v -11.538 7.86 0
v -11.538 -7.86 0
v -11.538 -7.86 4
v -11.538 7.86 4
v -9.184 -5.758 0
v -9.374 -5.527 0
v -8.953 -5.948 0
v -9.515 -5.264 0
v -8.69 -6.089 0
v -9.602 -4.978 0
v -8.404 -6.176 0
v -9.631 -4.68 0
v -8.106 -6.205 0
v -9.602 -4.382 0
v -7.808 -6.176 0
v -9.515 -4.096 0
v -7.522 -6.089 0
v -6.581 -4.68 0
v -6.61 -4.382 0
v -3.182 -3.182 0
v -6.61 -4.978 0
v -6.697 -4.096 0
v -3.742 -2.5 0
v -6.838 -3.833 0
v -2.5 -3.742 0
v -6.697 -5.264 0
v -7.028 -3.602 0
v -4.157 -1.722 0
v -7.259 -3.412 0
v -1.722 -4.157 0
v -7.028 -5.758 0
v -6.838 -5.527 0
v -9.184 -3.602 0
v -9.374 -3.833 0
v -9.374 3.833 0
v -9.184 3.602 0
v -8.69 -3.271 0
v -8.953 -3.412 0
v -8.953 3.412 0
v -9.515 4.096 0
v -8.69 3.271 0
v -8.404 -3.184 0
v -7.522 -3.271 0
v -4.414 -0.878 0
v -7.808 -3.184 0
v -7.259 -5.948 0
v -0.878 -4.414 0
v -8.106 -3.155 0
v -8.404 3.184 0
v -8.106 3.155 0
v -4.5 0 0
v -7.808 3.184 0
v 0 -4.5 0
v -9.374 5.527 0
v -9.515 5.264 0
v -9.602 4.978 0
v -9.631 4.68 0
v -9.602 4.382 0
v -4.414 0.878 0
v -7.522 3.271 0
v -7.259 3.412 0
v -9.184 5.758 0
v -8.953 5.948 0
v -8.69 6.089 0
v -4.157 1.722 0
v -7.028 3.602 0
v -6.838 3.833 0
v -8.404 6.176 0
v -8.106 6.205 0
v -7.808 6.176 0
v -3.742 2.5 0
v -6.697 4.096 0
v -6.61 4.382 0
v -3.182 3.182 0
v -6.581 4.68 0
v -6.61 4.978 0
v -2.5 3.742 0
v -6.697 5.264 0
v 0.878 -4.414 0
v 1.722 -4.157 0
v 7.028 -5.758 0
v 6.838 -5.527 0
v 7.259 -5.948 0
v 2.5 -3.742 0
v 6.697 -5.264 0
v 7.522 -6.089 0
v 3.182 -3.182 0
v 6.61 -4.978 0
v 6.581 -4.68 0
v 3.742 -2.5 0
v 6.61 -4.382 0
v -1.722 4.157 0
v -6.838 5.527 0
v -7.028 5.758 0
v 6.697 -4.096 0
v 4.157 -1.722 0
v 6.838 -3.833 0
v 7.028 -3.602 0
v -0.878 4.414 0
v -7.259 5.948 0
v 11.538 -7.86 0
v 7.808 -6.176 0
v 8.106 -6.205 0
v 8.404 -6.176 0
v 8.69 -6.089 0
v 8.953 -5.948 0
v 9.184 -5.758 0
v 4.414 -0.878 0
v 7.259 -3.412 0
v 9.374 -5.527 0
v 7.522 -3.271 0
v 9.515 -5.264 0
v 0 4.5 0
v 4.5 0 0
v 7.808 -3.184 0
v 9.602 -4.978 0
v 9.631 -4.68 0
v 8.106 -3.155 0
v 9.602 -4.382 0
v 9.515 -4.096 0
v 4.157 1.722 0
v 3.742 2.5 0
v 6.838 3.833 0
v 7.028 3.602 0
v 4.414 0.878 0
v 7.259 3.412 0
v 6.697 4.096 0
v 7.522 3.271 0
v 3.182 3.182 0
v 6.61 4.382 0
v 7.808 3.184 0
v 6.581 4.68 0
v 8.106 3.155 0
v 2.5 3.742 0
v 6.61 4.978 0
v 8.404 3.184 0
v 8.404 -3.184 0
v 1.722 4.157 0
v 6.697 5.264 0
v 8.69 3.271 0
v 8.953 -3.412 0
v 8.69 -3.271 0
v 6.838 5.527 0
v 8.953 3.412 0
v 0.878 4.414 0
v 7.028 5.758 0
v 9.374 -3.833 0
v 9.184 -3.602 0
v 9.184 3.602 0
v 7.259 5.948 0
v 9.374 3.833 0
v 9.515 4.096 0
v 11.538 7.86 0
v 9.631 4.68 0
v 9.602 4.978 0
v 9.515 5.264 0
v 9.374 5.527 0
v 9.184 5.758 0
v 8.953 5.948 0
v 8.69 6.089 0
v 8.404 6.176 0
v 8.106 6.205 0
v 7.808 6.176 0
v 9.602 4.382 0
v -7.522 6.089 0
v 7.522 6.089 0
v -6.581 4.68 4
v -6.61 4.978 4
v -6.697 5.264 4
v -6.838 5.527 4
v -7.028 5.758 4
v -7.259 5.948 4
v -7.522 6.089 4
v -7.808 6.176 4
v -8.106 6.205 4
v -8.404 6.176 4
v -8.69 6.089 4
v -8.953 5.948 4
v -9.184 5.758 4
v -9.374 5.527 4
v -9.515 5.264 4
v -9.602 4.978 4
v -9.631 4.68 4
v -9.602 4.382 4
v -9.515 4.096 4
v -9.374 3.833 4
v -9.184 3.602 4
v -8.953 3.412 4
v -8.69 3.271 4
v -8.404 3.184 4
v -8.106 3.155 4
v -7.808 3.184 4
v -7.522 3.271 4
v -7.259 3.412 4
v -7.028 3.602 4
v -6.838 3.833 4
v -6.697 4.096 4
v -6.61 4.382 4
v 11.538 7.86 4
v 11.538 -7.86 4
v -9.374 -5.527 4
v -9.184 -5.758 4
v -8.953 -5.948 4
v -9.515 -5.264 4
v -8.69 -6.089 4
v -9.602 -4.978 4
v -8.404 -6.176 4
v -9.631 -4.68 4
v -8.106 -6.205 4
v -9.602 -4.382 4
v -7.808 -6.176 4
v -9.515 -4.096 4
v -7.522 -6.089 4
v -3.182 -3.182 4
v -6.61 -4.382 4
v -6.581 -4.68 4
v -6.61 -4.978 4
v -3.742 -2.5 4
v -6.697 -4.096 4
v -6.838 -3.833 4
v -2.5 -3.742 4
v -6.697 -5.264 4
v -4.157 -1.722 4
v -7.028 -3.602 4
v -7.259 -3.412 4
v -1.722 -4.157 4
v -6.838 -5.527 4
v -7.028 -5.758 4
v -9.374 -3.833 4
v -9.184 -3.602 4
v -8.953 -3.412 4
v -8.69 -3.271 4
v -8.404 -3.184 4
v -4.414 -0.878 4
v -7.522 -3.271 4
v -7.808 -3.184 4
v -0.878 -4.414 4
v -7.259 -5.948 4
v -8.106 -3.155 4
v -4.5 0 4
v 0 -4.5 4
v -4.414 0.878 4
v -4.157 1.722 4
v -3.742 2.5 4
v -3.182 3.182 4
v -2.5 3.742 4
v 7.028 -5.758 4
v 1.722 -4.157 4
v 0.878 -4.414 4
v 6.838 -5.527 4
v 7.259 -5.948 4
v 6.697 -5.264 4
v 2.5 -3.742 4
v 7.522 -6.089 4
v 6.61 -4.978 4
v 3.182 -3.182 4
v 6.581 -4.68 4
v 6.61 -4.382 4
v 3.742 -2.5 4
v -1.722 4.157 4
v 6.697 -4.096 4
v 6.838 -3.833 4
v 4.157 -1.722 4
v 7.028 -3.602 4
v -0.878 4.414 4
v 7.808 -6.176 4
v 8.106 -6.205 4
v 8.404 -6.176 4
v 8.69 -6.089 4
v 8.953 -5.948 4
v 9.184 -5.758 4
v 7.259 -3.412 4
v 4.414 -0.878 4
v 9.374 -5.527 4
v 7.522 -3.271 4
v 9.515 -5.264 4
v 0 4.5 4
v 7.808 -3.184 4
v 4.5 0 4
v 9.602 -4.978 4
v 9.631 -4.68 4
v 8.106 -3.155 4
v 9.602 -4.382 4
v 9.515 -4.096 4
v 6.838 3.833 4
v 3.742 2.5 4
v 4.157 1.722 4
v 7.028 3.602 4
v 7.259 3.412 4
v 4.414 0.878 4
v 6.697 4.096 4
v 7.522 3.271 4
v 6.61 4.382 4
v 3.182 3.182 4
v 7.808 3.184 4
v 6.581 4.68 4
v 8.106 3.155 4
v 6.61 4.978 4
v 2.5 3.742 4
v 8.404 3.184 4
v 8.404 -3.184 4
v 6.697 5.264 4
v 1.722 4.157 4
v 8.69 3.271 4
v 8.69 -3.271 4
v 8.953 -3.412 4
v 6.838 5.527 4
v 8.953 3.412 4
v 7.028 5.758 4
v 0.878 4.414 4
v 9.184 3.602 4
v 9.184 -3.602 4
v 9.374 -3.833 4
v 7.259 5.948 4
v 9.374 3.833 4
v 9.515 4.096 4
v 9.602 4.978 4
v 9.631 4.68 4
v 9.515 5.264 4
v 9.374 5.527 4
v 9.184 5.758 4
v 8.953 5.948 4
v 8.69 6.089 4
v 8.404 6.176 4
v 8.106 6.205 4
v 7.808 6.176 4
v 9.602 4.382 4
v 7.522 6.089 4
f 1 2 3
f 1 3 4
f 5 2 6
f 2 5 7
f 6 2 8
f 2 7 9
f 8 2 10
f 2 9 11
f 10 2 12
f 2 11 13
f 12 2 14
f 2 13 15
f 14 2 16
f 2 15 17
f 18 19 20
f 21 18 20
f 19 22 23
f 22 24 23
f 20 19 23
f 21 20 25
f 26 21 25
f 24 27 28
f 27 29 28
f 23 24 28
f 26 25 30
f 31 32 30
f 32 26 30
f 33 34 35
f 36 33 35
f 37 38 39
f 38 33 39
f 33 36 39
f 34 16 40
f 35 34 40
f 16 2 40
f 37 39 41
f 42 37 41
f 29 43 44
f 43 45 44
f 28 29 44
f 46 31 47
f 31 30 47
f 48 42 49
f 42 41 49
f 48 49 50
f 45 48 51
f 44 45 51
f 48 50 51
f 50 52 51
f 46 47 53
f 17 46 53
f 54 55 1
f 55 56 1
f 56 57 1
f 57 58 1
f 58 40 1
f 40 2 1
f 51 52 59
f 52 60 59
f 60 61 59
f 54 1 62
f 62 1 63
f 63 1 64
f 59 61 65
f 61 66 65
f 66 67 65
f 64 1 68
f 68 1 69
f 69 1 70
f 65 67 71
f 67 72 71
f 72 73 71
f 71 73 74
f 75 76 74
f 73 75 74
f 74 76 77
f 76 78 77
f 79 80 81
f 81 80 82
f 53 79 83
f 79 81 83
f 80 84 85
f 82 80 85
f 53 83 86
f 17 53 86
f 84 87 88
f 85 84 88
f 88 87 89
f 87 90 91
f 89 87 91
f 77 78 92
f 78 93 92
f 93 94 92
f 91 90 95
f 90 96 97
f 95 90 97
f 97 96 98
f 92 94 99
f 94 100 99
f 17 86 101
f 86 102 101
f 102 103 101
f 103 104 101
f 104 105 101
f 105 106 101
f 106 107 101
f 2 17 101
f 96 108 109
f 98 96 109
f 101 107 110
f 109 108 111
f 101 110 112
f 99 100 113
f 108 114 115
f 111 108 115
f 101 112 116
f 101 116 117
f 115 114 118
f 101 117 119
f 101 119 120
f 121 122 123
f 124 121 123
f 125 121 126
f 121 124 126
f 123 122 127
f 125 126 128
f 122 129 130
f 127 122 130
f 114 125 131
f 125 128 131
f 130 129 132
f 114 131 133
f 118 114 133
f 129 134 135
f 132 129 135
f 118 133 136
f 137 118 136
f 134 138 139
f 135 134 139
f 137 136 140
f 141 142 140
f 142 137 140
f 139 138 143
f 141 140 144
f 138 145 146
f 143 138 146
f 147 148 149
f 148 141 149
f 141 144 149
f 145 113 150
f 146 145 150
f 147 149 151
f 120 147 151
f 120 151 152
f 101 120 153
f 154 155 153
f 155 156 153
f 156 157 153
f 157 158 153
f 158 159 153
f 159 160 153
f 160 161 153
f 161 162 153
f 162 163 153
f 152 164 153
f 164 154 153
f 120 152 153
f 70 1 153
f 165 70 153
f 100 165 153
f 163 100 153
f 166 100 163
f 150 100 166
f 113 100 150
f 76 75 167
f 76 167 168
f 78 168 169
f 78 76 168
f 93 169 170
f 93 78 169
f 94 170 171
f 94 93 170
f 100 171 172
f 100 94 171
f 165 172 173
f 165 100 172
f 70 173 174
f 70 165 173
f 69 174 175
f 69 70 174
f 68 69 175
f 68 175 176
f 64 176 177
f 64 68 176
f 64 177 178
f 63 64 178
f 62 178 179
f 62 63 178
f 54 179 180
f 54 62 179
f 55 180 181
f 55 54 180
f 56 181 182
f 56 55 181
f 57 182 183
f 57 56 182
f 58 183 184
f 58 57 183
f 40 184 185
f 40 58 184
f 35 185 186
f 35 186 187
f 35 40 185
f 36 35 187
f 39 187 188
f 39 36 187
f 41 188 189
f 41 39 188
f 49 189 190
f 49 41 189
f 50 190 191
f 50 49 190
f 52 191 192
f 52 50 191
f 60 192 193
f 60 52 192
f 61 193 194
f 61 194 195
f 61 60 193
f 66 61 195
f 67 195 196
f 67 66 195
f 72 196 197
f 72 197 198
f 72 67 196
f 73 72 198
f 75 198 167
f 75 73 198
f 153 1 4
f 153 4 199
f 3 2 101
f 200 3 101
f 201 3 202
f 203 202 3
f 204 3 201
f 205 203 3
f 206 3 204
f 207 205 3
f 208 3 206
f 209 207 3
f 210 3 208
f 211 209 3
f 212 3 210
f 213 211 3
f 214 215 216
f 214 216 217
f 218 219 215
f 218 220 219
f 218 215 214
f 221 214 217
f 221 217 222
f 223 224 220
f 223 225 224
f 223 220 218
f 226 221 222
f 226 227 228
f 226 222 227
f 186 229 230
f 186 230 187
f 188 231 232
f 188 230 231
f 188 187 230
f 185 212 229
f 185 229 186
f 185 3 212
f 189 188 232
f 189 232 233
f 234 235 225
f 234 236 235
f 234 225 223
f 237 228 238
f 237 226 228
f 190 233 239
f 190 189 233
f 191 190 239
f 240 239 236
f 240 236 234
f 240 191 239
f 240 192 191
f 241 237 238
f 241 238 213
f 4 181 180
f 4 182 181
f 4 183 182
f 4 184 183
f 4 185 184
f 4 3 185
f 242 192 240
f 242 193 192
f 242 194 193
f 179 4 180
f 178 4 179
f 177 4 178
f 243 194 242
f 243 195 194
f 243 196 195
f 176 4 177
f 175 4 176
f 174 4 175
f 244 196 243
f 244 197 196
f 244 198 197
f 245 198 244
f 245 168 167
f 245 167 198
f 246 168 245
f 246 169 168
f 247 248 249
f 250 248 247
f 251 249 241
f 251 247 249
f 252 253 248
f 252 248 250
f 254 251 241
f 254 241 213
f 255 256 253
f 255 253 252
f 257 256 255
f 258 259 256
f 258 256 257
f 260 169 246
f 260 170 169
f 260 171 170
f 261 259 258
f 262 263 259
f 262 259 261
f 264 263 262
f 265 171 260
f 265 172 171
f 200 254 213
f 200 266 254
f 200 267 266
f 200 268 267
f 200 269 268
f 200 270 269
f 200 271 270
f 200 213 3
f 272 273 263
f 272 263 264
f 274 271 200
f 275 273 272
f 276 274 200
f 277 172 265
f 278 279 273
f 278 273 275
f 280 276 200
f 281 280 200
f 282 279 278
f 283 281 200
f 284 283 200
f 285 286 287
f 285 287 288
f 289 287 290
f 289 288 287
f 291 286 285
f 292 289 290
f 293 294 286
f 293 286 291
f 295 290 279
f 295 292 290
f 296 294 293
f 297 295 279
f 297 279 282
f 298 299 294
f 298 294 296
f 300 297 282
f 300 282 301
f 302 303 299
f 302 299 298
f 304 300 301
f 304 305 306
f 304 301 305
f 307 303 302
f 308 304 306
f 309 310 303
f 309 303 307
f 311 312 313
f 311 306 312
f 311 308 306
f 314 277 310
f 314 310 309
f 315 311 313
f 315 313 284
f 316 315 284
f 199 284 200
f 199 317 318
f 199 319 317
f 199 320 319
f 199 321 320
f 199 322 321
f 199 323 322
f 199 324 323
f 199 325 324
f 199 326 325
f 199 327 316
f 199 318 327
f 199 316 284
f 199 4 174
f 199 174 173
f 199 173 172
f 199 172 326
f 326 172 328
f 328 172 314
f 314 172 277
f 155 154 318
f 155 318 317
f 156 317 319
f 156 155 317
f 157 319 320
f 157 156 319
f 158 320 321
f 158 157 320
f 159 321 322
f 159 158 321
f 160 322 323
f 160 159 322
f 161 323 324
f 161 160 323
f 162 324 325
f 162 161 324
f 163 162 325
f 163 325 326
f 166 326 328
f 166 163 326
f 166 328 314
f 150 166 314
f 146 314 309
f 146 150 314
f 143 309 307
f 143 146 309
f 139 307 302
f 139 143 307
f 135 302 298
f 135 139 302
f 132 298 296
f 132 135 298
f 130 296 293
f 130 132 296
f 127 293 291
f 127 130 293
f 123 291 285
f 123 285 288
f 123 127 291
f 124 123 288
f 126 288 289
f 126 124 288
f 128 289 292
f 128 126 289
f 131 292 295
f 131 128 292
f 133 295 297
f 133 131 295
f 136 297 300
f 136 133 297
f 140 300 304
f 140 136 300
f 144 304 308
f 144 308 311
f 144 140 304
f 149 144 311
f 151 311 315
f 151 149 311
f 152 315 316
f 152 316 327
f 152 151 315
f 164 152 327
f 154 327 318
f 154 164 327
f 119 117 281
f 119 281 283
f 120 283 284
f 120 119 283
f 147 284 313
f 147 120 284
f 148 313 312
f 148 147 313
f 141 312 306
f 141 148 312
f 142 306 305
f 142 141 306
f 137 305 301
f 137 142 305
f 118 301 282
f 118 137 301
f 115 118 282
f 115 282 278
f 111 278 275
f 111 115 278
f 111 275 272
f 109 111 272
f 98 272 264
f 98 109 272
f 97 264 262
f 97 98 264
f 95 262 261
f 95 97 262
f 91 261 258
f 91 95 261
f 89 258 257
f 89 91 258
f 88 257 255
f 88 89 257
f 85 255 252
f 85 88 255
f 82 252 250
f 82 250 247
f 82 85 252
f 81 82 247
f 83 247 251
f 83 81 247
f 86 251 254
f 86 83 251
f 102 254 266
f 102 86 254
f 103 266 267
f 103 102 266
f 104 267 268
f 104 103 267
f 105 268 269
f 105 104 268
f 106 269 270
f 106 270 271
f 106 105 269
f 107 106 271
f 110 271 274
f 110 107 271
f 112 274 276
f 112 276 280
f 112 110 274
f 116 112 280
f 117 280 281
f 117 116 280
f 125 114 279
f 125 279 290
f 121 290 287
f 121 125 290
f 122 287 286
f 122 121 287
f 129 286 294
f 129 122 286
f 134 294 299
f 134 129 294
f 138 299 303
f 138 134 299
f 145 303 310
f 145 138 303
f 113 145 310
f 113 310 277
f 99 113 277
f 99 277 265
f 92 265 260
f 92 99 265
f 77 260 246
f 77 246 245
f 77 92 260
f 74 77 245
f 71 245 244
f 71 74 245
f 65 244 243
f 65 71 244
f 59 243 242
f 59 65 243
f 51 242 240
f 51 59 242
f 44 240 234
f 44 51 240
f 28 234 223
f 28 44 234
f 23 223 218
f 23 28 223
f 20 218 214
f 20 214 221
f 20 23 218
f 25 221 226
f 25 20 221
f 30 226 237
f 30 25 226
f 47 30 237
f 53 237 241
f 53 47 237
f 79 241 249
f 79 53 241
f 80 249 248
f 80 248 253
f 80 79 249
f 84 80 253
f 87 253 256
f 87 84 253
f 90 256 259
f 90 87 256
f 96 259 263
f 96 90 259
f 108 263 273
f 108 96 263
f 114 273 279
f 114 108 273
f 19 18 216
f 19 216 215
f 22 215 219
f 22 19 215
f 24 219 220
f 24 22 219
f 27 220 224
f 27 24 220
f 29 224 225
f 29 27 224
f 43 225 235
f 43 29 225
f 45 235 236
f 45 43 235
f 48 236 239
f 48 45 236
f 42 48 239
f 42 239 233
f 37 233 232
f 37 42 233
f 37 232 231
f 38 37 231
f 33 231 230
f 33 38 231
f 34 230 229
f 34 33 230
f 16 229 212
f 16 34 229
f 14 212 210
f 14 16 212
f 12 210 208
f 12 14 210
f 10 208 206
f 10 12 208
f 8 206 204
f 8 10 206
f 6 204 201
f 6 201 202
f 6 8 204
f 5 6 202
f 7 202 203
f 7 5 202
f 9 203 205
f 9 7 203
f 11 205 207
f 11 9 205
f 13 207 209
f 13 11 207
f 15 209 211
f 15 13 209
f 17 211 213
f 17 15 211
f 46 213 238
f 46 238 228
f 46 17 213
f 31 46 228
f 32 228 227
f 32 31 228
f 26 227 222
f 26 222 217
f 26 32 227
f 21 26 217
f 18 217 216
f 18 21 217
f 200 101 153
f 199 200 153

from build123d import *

# Parameters (mm, degrees)
SKETCH1_W           = 23.075946232
SKETCH1_H           = 15.72
SKETCH1_R           = 1.525
SKETCH1_R_2         = 4.5
BOSS_EXTRUDE2_DEPTH = 4


with BuildPart() as part:
    # Sketch1 → Boss-Extrude2 (new body)
    with BuildSketch(Plane.XY):
        Rectangle(SKETCH1_W, SKETCH1_H)
        with Locations((-8.105997779, -4.68)):
            Circle(SKETCH1_R, mode=Mode.SUBTRACT)
        with Locations((8.105997779, -4.68)):
            Circle(SKETCH1_R, mode=Mode.SUBTRACT)
        with Locations((8.105997779, 4.68)):
            Circle(SKETCH1_R, mode=Mode.SUBTRACT)
        with Locations((-8.105997779, 4.68)):
            Circle(SKETCH1_R, mode=Mode.SUBTRACT)
        Polygon((3.671947712, -6.36), (7.343895424, 0), (3.671947712, 6.36), (-3.671947712, 6.36), (-7.343895424, 0), (-3.671947712, -6.36), align=None, mode=Mode.SUBTRACT)
        Polygon((-3.671947712, -6.36), (3.671947712, -6.36), (7.343895424, 0), (3.671947712, 6.36), (-3.671947712, 6.36), (-7.343895424, 0), align=None)
        Circle(SKETCH1_R_2, mode=Mode.SUBTRACT)
    extrude(amount=BOSS_EXTRUDE2_DEPTH)


solid = part.part
